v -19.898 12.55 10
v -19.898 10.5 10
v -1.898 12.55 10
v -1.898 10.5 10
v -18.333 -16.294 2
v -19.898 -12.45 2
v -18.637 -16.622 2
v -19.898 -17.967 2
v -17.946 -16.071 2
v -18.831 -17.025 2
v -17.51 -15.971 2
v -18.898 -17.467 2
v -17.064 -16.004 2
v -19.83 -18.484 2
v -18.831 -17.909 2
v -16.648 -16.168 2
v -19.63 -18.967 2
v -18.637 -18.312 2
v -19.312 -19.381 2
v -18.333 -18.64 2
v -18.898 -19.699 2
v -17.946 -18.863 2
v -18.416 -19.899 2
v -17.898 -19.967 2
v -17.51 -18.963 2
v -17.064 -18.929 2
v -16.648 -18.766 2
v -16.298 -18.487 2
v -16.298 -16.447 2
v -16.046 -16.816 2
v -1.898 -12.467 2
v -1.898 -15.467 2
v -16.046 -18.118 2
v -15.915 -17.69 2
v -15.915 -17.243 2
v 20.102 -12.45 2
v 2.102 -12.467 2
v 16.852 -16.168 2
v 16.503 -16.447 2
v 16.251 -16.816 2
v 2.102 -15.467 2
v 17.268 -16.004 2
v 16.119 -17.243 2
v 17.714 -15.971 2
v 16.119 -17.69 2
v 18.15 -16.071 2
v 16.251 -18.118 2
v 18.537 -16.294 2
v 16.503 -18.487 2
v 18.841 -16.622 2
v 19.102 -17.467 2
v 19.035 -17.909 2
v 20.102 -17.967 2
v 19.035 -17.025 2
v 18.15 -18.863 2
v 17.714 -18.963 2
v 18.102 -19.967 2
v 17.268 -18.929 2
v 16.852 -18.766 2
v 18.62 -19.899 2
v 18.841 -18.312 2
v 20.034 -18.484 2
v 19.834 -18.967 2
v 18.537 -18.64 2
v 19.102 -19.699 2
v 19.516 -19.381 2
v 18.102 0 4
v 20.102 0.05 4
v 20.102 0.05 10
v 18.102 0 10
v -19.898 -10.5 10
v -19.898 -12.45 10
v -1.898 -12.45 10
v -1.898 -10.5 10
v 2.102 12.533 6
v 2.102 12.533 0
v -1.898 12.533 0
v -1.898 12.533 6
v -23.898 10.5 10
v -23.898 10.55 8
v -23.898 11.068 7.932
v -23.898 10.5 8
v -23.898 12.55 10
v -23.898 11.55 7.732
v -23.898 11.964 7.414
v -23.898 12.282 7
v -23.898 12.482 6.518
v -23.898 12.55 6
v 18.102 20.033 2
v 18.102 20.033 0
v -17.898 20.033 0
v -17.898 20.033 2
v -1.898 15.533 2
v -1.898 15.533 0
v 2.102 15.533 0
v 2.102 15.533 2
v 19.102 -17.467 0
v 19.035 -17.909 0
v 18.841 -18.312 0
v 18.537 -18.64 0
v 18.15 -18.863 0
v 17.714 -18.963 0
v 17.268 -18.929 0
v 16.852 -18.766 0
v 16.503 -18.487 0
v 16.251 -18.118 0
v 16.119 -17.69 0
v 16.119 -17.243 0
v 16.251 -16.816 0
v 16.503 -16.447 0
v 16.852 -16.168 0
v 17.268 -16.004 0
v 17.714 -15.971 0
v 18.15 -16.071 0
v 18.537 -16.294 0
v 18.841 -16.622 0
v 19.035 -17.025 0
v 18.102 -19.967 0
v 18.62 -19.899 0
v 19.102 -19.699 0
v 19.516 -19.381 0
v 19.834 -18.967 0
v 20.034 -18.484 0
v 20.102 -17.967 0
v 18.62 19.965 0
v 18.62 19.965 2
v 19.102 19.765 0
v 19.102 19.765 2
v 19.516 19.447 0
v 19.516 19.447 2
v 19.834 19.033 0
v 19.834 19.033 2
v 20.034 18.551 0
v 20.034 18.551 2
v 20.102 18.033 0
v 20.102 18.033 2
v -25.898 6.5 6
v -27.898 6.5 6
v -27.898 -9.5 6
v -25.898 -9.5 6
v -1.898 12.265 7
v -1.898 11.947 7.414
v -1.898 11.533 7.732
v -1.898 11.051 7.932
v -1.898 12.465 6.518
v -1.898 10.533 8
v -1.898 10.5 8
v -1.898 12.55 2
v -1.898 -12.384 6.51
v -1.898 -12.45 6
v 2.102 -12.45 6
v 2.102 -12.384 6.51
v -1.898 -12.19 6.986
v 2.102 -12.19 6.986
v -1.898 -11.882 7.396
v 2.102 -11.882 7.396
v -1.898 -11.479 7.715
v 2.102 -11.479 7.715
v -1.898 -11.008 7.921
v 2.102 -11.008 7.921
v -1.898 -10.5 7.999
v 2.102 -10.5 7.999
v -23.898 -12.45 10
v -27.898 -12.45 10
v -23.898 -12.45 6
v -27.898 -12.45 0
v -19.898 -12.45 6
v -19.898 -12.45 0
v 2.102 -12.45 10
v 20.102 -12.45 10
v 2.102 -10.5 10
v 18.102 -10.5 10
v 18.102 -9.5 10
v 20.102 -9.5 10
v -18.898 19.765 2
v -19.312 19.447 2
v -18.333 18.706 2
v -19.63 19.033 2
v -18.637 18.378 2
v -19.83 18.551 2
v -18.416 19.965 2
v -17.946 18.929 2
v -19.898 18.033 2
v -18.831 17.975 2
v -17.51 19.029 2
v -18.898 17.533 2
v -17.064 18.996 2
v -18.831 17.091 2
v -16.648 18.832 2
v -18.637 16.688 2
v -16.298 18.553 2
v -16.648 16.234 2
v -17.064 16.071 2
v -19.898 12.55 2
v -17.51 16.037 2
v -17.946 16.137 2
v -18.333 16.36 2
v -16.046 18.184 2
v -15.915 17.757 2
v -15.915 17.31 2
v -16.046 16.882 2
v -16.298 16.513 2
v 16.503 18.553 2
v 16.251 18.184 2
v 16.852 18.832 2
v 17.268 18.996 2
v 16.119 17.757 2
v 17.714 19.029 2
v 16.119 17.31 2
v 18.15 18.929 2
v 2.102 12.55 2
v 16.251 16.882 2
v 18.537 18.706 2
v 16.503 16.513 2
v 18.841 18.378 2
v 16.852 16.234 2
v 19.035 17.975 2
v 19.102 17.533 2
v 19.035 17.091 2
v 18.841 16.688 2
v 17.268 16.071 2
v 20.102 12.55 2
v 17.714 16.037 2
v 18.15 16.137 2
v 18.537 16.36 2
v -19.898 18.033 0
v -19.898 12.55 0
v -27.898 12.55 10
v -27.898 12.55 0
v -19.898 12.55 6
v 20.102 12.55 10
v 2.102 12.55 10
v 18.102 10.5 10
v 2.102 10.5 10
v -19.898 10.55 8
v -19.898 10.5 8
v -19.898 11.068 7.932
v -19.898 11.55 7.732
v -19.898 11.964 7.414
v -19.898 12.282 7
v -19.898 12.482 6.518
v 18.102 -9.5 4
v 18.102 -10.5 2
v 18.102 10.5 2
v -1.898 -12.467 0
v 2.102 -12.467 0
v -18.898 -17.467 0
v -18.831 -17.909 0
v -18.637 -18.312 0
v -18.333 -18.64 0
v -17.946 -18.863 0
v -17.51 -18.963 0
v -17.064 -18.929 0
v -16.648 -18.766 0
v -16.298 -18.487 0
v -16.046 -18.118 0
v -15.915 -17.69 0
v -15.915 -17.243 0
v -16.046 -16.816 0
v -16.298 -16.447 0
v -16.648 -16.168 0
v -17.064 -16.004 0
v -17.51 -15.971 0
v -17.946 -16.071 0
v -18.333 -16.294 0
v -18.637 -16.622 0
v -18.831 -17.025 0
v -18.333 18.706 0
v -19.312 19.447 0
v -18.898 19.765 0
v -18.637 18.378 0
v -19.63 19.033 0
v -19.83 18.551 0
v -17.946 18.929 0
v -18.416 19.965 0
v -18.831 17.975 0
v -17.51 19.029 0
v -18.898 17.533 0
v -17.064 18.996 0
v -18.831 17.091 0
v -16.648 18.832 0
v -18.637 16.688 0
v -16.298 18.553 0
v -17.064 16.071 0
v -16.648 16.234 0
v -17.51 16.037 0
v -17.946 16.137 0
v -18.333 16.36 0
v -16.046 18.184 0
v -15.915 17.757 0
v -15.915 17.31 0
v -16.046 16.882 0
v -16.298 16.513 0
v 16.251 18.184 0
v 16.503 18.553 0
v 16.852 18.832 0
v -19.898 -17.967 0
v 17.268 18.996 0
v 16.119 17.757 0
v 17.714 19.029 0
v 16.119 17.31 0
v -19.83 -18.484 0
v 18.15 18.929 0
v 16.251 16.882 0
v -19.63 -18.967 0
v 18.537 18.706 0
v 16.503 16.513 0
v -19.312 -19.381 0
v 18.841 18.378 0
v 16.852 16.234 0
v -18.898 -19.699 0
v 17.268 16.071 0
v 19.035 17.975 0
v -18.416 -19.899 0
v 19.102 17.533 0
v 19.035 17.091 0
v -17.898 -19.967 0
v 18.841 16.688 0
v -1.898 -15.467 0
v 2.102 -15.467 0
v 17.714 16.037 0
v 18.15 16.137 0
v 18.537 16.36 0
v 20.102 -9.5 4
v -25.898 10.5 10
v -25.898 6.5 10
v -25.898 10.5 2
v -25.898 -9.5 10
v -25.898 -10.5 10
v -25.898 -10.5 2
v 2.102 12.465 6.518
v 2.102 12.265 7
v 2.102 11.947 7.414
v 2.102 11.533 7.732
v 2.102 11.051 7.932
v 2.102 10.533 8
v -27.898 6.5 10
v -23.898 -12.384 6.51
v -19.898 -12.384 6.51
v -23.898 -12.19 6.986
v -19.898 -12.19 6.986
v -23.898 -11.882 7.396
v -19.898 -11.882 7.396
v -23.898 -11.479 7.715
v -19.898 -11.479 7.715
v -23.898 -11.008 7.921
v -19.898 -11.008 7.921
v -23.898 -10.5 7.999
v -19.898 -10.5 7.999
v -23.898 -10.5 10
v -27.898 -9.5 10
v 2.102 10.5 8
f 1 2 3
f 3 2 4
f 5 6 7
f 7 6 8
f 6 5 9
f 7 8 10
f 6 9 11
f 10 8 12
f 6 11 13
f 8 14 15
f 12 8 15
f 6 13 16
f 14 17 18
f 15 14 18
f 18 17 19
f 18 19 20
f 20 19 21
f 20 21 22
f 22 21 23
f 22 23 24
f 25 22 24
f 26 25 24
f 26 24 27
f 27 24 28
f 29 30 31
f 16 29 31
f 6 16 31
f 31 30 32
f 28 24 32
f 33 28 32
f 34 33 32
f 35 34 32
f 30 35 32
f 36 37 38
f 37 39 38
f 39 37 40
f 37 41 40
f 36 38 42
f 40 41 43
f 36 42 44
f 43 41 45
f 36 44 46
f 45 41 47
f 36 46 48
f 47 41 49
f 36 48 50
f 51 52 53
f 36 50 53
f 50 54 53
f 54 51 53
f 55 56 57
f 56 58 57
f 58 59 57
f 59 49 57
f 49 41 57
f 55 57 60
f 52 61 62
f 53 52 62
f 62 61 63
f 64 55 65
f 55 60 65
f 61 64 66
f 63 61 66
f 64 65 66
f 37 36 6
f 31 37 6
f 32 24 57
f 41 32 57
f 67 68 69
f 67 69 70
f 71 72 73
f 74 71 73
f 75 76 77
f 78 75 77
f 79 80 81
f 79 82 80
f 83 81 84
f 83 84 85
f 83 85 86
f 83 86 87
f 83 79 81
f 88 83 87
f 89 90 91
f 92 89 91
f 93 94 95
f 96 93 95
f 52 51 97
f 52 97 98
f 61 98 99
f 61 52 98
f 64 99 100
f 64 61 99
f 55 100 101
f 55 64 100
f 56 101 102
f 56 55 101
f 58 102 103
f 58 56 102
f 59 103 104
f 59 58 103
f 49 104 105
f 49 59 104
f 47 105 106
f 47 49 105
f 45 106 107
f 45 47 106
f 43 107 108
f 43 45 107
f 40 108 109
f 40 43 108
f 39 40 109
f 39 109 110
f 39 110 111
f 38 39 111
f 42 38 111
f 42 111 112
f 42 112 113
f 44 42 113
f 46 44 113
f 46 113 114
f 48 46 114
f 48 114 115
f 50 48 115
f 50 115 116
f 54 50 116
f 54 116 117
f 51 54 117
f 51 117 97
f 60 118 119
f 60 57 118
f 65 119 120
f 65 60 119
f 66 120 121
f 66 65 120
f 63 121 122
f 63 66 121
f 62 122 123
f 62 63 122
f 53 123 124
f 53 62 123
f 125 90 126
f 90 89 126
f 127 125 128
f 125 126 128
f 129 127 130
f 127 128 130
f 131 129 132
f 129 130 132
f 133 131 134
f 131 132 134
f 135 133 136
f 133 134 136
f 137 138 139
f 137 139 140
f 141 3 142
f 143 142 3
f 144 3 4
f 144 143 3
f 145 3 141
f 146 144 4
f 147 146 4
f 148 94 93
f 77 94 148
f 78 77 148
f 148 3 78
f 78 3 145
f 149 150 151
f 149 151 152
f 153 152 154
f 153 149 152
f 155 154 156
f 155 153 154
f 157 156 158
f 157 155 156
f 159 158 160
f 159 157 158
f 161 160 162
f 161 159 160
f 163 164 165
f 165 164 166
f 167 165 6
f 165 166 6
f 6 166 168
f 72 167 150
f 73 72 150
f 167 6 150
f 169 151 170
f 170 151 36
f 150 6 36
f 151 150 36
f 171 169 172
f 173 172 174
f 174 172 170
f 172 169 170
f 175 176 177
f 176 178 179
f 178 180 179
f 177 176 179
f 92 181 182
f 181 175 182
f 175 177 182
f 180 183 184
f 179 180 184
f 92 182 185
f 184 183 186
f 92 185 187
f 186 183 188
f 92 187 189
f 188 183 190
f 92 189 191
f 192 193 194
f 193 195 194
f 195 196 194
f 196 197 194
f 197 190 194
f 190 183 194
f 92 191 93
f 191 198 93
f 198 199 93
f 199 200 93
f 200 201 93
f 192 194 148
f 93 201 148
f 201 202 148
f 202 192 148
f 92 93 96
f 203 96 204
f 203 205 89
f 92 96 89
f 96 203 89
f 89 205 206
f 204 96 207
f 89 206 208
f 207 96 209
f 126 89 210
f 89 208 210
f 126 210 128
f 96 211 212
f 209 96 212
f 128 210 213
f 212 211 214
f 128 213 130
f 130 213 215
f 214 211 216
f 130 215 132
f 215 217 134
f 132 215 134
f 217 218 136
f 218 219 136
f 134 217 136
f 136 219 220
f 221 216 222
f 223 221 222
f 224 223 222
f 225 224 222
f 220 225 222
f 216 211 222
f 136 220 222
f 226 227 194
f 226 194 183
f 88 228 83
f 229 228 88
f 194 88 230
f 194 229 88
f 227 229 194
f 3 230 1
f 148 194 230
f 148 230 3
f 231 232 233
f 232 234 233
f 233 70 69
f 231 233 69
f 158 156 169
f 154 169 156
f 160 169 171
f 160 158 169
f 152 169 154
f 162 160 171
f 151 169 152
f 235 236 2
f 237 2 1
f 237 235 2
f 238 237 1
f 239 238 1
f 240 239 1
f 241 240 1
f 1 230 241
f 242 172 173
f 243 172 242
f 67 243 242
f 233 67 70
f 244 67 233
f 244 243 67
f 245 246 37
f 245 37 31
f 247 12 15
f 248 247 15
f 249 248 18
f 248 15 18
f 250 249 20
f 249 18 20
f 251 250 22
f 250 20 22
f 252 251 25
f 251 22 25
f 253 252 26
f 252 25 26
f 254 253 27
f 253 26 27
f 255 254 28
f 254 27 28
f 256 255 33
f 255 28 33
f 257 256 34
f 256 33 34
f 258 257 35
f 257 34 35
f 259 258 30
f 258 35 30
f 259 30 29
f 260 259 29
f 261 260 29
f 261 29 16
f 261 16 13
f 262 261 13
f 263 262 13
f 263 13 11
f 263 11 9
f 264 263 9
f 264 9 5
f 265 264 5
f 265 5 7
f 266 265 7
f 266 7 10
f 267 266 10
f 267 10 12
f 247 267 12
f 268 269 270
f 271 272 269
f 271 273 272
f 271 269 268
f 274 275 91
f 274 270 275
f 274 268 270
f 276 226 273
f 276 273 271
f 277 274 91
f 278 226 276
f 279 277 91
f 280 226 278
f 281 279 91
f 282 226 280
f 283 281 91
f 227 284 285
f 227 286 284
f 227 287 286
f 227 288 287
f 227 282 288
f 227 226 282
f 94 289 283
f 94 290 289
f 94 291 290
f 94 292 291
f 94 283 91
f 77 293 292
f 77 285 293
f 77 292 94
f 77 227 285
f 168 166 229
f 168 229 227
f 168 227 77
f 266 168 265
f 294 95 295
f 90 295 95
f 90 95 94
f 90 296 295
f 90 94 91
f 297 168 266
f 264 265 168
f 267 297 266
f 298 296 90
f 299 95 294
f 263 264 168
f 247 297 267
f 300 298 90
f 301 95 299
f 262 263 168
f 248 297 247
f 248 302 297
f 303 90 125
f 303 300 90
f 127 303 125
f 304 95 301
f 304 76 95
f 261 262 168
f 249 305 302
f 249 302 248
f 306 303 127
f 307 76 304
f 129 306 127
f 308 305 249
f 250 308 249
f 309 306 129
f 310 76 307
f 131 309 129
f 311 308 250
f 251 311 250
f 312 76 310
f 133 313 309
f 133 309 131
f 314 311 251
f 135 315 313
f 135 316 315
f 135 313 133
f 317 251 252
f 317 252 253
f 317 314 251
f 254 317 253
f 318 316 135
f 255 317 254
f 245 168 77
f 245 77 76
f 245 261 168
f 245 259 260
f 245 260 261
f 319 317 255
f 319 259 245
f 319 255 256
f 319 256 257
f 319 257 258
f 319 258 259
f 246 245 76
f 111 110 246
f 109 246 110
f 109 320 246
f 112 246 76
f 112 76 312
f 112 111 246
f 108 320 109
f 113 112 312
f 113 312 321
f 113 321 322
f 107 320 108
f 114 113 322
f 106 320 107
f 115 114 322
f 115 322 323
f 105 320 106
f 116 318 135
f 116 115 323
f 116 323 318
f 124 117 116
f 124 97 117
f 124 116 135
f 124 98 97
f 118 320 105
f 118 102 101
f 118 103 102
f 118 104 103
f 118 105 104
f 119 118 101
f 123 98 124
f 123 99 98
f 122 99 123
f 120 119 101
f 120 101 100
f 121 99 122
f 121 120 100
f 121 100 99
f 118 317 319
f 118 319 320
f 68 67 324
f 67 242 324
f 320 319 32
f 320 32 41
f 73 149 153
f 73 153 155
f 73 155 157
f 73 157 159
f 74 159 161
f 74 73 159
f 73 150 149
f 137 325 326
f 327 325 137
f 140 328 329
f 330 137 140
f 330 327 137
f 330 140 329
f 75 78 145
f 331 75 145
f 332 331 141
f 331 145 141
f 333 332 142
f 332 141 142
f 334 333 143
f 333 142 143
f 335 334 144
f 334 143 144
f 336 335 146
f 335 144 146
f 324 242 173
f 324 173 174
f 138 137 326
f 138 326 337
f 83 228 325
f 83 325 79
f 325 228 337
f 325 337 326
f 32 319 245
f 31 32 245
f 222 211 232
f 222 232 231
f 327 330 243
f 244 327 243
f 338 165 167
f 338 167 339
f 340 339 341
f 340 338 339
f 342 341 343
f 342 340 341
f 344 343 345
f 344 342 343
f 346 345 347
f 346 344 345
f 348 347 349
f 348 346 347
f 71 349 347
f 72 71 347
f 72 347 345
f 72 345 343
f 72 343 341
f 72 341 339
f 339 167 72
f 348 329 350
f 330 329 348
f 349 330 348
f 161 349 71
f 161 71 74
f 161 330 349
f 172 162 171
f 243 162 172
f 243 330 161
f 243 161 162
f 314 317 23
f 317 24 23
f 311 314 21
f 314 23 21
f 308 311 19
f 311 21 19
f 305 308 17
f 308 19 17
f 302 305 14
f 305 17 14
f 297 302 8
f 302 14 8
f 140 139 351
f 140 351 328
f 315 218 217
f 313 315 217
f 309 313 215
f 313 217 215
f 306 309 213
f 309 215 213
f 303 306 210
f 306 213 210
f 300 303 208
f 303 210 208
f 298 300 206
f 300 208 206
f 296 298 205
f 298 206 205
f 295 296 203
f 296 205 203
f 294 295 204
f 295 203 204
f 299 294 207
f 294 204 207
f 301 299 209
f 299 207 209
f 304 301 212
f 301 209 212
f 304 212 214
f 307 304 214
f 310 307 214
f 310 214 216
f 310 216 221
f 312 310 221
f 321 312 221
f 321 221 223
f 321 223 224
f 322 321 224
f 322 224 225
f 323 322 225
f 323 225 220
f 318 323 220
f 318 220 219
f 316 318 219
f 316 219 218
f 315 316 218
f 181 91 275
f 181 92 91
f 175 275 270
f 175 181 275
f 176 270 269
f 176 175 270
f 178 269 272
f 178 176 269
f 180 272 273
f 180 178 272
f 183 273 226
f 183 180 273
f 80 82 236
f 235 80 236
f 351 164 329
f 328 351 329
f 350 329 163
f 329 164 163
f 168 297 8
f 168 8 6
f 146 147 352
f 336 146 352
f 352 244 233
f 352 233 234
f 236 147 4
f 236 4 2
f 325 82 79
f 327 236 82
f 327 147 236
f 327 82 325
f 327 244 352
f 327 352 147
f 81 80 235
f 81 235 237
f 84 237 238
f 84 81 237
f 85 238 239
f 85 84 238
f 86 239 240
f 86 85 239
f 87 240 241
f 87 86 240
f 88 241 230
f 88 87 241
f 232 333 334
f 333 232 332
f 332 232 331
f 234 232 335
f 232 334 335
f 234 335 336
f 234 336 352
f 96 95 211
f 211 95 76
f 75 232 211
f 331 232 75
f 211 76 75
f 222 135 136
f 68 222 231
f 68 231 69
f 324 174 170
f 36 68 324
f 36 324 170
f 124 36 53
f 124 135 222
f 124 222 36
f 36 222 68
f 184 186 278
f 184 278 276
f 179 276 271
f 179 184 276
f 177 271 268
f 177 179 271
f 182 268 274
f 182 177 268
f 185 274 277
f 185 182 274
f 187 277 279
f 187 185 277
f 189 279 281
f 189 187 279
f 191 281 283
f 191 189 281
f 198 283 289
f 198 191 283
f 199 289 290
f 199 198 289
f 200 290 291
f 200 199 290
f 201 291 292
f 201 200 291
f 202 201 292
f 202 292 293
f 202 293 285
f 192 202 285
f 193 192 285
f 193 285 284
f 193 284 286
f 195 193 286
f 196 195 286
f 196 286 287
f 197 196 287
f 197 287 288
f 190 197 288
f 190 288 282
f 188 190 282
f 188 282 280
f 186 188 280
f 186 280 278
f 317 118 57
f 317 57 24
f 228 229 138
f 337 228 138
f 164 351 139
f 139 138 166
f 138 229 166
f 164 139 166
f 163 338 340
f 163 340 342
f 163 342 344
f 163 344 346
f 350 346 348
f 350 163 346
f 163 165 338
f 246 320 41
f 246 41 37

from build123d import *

# Parameters (mm, degrees)
F1_DEPTH     = 2
F2_R         = 2
F3_D         = 3
F7_DEPTH     = 2
F6_W         = 4
F6_H         = 1.95
F6_H_2       = 2.05
F6_H_3       = 2.0331665652
F8_DEPTH     = 8
F6_W_2       = 18
F9_DEPTH     = 10
F10_T1_DEPTH = 4
F10_T3_DEPTH = 4
F11_DEPTH    = 4
F6_W_3       = 2
F6_H_4       = 16
F12_DEPTH    = 6


# Not quite as in the source:
# - a fillet or chamfer that OpenCascade refuses, or shapes differently, is made with other operations: its cross-section is extruded or revolved along the edge and cut away or added


with BuildPart() as f1:
    # F0 (on Top) → F1 (new body)
    with BuildSketch(Plane.XY):
        Polygon((-19.8978664808, -19.9668334348), (0.1021335192, -19.9668334348), (0.1021335192, -15.4668334348), (-1.8978664808, -15.4668334348), (-1.8978664808, -12.4668334348), (0.1021335192, -12.4668334348), (0.1021335192, 0.0331665652), (-19.8978664808, 0.0331665652), align=None)
    extrude(amount=F1_DEPTH)

    # F2
    f2_edges = [f1.edges().sort_by_distance(p)[0] for p in [
        (-19.897866, -19.966833, 1),
    ]]
    fillet(f2_edges, radius=F2_R)

    # F3 (through all)
    with Locations(Plane(origin=(0, 0, 0), x_dir=(1, 0, 0), z_dir=(0, 0, -1))):
        with Locations((-17.3978664808, 17.4668334348)):
            Hole(F3_D / 2)

    # F4: F1 across face


with BuildPart() as f1_1:
    add(f1.part)
    add(f1.part.mirror(Plane(origin=(0.1021335192, -6.2168334348, 1), x_dir=(0, 1, 0), z_dir=(1, 0, 0))))

    # F5: F1 across face


with BuildPart() as f1_2:
    add(f1_1.part)
    add(f1_1.part.mirror(Plane(origin=(0.1021335192, 0.0331665652, 1), x_dir=(-1, 0, 0), z_dir=(0, 1, 0))))

    # F6 (on face) → F7 (join)
    with BuildSketch(Plane(origin=(0, 0, 0), x_dir=(1, 0, 0), z_dir=(0, 0, -1))):
        Polygon((-25.8978664808, -10.5), (-23.8978664808, -10.5), (-19.8978664808, -10.5), (-19.8978664808, 10.5), (-23.8978664808, 10.5), (-25.8978664808, 10.5), (-25.8978664808, 9.5), (-25.8978664808, -6.5), align=None)
        Polygon((18.1021335192, 0), (20.1021335192, -0.05), (20.1021335192, 9.5), (18.1021335192, 9.5), align=None)
        Polygon((-19.8978664808, 10.5), (-19.8978664808, -10.5), (-1.8978664808, -10.5), (2.1021335192, -10.5), (18.1021335192, -10.5), (18.1021335192, 0), (18.1021335192, 9.5), (18.1021335192, 10.5), (2.1021335192, 10.5), (-1.8978664808, 10.5), align=None)
    extrude(amount=-F7_DEPTH)

    # F6 (on face) → F8 (join)
    with BuildSketch(Plane(origin=(0, 0, 0), x_dir=(1, 0, 0), z_dir=(0, 0, -1))):
        with Locations((-21.8978664808, 11.475)):
            Rectangle(F6_W, F6_H)
        with Locations((-21.8978664808, -11.525)):
            Rectangle(F6_W, F6_H_2)
        with Locations((0.1021335192, -11.5165832826)):
            Rectangle(F6_W, F6_H_3)
        with Locations((0.1021335192, 11.475)):
            Rectangle(F6_W, F6_H)
    extrude(amount=-F8_DEPTH)

    # F6 (on face) → F9 (join)
    with BuildSketch(Plane(origin=(0, 0, 0), x_dir=(1, 0, 0), z_dir=(0, 0, -1))):
        Polygon((-27.8978664808, -12.55), (-23.8978664808, -12.55), (-23.8978664808, -10.5), (-25.8978664808, -10.5), (-25.8978664808, -6.5), (-27.8978664808, -6.5), align=None)
        Polygon((-27.8978664808, 12.45), (-27.8978664808, 9.5), (-25.8978664808, 9.5), (-25.8978664808, 10.5), (-23.8978664808, 10.5), (-23.8978664808, 12.45), align=None)
        Polygon((-19.8978664808, -10.5), (-19.8978664808, -12.55), (-1.8978664808, -12.55), (-1.8978664808, -12.5331665652), (-1.8978664808, -10.5), align=None)
        Polygon((2.1021335192, -12.5331665652), (2.1021335192, -12.55), (20.1021335192, -12.55), (20.1021335192, -0.05), (18.1021335192, 0), (18.1021335192, -10.5), (2.1021335192, -10.5), align=None)
        Polygon((2.1021335192, 12.45), (2.1021335192, 10.5), (18.1021335192, 10.5), (18.1021335192, 9.5), (20.1021335192, 9.5), (20.1021335192, 12.45), align=None)
        with Locations((-10.8978664808, 11.475)):
            Rectangle(F6_W_2, F6_H)
    extrude(amount=-F9_DEPTH)

    # F10: fillet of radius 2 on 4 edges, made by hand

    # F10_s2 → F10_t1 (cut)
    with BuildSketch(Plane.YZ.offset(-23.8978664808)):
        with BuildLine():
            ThreePointArc((10.55, 8), (11.9642135624, 7.4142135624), (12.55, 6))
            Line((12.55, 6), (12.55, 8))
            Line((12.55, 8), (10.55, 8))
        make_face()
        with BuildLine():
            ThreePointArc((-12.45, 6), (-11.8642135624, 7.4142135624), (-10.45, 8))
            Line((-10.45, 8), (-12.45, 8))
            Line((-12.45, 8), (-12.45, 6))
        make_face()
    extrude(amount=F10_T1_DEPTH, mode=Mode.SUBTRACT)

    # F10_s4 → F10_t3 (cut)
    with BuildSketch(Plane.YZ.offset(-1.8978664808)):
        with BuildLine():
            ThreePointArc((-12.45, 6), (-11.8642135624, 7.4142135624), (-10.45, 8))
            Line((-10.45, 8), (-12.45, 8))
            Line((-12.45, 8), (-12.45, 6))
        make_face()
        with BuildLine():
            ThreePointArc((12.5331665652, 6), (11.9473801276, 7.4142135624), (10.5331665652, 8))
            Line((10.5331665652, 8), (12.5331665652, 8))
            Line((12.5331665652, 8), (12.5331665652, 6))
        make_face()
    extrude(amount=F10_T3_DEPTH, mode=Mode.SUBTRACT)

    # F6 (on face) → F11 (join)
    with BuildSketch(Plane(origin=(0, 0, 0), x_dir=(1, 0, 0), z_dir=(0, 0, -1))):
        Polygon((18.1021335192, 0), (20.1021335192, -0.05), (20.1021335192, 9.5), (18.1021335192, 9.5), align=None)
    extrude(amount=-F11_DEPTH)

    # F6 (on face) → F12 (join)
    with BuildSketch(Plane(origin=(0, 0, 0), x_dir=(1, 0, 0), z_dir=(0, 0, -1))):
        with Locations((-26.8978664808, 1.5)):
            Rectangle(F6_W_3, F6_H_4)
    extrude(amount=-F12_DEPTH)


solid = f1_2.part
